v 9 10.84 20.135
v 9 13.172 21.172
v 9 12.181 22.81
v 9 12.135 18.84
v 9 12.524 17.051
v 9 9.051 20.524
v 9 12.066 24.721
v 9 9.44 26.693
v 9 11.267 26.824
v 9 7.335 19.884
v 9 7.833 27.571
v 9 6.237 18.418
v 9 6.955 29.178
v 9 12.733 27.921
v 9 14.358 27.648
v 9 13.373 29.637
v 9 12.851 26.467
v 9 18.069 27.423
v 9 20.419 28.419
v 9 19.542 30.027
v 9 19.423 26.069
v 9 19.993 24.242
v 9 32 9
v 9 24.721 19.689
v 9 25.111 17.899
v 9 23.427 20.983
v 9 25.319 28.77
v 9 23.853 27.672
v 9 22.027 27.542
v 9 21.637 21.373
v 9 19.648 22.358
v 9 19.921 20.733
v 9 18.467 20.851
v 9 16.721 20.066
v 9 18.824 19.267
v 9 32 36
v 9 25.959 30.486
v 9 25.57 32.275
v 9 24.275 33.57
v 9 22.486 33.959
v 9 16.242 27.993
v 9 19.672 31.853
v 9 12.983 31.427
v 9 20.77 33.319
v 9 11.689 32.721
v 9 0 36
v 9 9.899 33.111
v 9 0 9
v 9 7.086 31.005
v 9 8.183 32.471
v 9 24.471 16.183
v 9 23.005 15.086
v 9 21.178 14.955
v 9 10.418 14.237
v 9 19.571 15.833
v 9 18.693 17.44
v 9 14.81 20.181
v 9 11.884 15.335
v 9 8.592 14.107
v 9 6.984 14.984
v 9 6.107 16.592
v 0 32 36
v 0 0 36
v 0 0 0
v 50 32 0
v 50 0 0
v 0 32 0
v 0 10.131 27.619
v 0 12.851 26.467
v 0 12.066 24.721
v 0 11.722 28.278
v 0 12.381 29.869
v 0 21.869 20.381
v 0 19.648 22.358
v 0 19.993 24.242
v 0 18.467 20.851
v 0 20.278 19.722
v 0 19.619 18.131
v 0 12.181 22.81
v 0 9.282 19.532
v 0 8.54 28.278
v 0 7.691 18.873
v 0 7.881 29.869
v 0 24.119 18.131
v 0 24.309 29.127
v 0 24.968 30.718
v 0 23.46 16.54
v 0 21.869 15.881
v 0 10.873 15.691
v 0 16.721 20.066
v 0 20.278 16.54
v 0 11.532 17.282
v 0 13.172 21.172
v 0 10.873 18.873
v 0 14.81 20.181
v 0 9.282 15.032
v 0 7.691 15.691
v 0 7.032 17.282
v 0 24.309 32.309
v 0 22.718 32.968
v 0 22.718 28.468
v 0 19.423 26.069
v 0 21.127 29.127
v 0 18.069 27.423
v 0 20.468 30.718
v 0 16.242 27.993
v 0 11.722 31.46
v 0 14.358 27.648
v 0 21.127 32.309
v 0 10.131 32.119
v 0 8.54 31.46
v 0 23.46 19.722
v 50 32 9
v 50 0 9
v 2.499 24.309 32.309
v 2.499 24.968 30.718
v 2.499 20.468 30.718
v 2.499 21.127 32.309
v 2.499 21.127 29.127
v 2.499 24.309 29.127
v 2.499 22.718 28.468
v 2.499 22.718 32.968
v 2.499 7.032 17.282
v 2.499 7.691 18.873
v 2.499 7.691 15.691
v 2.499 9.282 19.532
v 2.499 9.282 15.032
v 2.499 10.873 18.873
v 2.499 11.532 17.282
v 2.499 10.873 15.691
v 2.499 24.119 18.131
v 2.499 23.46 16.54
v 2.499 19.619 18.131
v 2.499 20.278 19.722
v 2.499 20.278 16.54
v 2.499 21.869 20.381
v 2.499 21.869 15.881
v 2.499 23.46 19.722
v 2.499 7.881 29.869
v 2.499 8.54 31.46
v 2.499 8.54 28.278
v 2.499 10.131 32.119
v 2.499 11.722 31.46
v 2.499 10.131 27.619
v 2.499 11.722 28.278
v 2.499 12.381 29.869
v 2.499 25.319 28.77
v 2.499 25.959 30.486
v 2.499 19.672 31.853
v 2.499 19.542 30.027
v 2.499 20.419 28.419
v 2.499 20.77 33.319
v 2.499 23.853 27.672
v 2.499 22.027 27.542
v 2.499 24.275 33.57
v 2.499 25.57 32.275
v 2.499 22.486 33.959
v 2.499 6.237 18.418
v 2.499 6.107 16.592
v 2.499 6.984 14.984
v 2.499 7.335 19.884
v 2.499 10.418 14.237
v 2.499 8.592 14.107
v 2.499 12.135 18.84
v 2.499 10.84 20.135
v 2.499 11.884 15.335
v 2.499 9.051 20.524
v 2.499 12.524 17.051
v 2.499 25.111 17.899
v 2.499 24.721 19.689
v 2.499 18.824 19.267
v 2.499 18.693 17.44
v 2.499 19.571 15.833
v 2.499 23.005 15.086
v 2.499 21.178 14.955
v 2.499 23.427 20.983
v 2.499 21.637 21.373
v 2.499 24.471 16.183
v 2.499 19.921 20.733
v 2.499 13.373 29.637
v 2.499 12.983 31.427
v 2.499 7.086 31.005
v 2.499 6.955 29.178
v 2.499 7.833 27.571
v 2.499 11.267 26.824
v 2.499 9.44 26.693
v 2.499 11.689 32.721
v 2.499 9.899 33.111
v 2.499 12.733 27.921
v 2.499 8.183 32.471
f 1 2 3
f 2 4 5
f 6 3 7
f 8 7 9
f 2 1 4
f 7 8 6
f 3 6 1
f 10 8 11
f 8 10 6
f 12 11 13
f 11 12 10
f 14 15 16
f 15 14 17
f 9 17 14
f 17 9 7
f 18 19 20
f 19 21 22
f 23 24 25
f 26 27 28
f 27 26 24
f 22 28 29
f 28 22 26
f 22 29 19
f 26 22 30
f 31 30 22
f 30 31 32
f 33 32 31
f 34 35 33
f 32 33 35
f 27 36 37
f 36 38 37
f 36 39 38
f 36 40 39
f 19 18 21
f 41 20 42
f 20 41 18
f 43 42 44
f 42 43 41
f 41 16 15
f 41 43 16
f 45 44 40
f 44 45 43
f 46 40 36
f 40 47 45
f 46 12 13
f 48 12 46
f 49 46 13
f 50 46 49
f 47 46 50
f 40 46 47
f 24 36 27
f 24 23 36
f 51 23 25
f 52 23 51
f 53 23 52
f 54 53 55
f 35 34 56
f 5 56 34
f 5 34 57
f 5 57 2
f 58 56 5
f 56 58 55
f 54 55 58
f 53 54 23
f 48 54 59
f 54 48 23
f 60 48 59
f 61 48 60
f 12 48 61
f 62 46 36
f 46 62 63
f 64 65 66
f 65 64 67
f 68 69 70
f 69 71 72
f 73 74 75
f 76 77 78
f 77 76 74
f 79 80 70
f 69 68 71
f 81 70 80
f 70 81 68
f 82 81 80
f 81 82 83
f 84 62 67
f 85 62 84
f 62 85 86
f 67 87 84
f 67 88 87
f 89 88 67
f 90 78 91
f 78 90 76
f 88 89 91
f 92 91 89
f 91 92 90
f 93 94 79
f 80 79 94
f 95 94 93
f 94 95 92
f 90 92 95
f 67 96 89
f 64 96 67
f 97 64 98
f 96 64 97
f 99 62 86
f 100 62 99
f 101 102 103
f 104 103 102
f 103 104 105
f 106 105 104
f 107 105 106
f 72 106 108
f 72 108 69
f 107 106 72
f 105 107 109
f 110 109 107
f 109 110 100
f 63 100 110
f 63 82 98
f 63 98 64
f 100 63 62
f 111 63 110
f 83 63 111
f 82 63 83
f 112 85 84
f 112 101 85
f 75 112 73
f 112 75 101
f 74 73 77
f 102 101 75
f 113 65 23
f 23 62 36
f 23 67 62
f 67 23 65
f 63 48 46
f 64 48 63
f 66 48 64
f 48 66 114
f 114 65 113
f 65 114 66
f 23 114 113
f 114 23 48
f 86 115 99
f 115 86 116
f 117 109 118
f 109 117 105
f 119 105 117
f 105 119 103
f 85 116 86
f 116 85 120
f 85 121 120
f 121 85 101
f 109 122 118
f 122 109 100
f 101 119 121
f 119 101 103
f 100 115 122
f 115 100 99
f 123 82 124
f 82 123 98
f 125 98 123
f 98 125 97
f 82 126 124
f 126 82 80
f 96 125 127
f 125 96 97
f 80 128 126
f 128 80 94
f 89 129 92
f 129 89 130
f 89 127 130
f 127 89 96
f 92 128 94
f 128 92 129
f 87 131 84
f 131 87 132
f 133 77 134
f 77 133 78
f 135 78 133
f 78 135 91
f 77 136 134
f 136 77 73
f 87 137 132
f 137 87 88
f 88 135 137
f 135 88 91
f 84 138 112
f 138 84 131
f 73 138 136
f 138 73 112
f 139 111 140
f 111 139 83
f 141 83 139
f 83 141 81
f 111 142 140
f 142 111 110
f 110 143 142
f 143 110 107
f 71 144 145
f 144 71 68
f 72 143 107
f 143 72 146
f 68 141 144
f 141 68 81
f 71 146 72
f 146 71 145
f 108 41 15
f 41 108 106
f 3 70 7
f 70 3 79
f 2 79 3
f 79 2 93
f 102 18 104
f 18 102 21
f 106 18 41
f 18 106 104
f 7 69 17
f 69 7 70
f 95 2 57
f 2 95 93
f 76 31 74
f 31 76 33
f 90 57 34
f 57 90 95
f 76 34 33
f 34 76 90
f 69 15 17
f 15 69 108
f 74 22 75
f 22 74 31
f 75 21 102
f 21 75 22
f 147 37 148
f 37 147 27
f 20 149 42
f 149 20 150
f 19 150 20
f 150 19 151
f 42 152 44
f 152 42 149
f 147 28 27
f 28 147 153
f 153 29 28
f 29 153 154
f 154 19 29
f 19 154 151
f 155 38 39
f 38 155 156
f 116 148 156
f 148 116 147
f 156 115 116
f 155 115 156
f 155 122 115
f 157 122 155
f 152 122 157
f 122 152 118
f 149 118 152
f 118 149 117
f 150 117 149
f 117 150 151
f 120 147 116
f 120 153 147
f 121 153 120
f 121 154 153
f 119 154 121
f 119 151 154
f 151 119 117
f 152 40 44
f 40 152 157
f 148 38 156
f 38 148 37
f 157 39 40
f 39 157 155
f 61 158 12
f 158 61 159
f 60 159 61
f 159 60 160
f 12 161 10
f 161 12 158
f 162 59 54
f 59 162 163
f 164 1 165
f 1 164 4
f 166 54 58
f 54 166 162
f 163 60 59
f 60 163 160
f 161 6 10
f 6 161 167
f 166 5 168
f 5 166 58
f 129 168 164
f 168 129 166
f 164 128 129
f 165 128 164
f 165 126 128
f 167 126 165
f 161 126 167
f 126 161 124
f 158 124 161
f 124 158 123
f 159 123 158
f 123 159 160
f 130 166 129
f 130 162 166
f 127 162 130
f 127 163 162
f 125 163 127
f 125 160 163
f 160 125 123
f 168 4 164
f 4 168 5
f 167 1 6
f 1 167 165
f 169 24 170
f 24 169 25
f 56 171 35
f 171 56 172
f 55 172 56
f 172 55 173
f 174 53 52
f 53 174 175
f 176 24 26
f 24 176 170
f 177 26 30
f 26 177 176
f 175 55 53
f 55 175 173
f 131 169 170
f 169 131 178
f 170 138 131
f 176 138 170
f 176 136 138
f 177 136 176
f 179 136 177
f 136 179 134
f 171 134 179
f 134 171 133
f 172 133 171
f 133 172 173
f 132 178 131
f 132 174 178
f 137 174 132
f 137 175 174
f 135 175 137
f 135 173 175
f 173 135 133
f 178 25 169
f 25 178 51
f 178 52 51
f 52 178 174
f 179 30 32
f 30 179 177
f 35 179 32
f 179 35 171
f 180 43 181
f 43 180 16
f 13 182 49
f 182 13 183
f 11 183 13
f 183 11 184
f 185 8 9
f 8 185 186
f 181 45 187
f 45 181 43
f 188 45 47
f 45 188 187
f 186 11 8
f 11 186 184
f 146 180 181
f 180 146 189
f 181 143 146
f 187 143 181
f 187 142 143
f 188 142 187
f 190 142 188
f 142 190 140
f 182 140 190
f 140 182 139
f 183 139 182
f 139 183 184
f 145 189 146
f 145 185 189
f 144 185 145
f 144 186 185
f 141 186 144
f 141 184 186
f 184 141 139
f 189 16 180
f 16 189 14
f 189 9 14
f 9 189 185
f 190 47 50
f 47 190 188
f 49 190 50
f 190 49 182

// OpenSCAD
module motor_mount(mount_t) {
    m_d1 = 16.6; // distance between closer together motor mounting holes
    m_d2 = 19; // and between the farther apart ones
    m_hole_d = 8; // center hole diameter
    screwhead_hole_d = 6.5;
    screw_hole_d = 4.5;

    translate([0, 0, 0]) {
        rotate([0, 0, 45]) {
            translate([-m_d2/2, 0, 0])
                cylinder(d=screw_hole_d, h=mount_t);
            translate([m_d2/2, 0, 0])
                cylinder(d=screw_hole_d, h=mount_t);
            translate([0, -m_d1/2, 0])
                cylinder(d=screw_hole_d, h=mount_t);
            translate([0, m_d1/2, 0])
                cylinder(d=screw_hole_d, h=mount_t);
            translate([0, 0, 0])
                cylinder(d=m_hole_d, h=mount_t);
            // hole to allow screw head to come through part way
            translate([-m_d2/2, 0, 0])
                cylinder(d=screwhead_hole_d, h=mount_t-2.5);
            translate([m_d2/2, 0, 0])
                cylinder(d=screwhead_hole_d, h=mount_t-2.5);
            translate([0, -m_d1/2, 0])
                cylinder(d=screwhead_hole_d, h=mount_t-2.5);
            translate([0, m_d1/2, 0])
                cylinder(d=screwhead_hole_d, h=mount_t-2.5);
        }
    }
}


difference() {
    thick = 9;
    width = 32;
    height = 36;
    base = 50;
    union() {
        cube([thick, width, height]);
        cube([base, width, thick]);
    }
    translate([thick+0.001, width/2, height-12])
    rotate([180, 90, 0])
    motor_mount(thick+0.002);
}
